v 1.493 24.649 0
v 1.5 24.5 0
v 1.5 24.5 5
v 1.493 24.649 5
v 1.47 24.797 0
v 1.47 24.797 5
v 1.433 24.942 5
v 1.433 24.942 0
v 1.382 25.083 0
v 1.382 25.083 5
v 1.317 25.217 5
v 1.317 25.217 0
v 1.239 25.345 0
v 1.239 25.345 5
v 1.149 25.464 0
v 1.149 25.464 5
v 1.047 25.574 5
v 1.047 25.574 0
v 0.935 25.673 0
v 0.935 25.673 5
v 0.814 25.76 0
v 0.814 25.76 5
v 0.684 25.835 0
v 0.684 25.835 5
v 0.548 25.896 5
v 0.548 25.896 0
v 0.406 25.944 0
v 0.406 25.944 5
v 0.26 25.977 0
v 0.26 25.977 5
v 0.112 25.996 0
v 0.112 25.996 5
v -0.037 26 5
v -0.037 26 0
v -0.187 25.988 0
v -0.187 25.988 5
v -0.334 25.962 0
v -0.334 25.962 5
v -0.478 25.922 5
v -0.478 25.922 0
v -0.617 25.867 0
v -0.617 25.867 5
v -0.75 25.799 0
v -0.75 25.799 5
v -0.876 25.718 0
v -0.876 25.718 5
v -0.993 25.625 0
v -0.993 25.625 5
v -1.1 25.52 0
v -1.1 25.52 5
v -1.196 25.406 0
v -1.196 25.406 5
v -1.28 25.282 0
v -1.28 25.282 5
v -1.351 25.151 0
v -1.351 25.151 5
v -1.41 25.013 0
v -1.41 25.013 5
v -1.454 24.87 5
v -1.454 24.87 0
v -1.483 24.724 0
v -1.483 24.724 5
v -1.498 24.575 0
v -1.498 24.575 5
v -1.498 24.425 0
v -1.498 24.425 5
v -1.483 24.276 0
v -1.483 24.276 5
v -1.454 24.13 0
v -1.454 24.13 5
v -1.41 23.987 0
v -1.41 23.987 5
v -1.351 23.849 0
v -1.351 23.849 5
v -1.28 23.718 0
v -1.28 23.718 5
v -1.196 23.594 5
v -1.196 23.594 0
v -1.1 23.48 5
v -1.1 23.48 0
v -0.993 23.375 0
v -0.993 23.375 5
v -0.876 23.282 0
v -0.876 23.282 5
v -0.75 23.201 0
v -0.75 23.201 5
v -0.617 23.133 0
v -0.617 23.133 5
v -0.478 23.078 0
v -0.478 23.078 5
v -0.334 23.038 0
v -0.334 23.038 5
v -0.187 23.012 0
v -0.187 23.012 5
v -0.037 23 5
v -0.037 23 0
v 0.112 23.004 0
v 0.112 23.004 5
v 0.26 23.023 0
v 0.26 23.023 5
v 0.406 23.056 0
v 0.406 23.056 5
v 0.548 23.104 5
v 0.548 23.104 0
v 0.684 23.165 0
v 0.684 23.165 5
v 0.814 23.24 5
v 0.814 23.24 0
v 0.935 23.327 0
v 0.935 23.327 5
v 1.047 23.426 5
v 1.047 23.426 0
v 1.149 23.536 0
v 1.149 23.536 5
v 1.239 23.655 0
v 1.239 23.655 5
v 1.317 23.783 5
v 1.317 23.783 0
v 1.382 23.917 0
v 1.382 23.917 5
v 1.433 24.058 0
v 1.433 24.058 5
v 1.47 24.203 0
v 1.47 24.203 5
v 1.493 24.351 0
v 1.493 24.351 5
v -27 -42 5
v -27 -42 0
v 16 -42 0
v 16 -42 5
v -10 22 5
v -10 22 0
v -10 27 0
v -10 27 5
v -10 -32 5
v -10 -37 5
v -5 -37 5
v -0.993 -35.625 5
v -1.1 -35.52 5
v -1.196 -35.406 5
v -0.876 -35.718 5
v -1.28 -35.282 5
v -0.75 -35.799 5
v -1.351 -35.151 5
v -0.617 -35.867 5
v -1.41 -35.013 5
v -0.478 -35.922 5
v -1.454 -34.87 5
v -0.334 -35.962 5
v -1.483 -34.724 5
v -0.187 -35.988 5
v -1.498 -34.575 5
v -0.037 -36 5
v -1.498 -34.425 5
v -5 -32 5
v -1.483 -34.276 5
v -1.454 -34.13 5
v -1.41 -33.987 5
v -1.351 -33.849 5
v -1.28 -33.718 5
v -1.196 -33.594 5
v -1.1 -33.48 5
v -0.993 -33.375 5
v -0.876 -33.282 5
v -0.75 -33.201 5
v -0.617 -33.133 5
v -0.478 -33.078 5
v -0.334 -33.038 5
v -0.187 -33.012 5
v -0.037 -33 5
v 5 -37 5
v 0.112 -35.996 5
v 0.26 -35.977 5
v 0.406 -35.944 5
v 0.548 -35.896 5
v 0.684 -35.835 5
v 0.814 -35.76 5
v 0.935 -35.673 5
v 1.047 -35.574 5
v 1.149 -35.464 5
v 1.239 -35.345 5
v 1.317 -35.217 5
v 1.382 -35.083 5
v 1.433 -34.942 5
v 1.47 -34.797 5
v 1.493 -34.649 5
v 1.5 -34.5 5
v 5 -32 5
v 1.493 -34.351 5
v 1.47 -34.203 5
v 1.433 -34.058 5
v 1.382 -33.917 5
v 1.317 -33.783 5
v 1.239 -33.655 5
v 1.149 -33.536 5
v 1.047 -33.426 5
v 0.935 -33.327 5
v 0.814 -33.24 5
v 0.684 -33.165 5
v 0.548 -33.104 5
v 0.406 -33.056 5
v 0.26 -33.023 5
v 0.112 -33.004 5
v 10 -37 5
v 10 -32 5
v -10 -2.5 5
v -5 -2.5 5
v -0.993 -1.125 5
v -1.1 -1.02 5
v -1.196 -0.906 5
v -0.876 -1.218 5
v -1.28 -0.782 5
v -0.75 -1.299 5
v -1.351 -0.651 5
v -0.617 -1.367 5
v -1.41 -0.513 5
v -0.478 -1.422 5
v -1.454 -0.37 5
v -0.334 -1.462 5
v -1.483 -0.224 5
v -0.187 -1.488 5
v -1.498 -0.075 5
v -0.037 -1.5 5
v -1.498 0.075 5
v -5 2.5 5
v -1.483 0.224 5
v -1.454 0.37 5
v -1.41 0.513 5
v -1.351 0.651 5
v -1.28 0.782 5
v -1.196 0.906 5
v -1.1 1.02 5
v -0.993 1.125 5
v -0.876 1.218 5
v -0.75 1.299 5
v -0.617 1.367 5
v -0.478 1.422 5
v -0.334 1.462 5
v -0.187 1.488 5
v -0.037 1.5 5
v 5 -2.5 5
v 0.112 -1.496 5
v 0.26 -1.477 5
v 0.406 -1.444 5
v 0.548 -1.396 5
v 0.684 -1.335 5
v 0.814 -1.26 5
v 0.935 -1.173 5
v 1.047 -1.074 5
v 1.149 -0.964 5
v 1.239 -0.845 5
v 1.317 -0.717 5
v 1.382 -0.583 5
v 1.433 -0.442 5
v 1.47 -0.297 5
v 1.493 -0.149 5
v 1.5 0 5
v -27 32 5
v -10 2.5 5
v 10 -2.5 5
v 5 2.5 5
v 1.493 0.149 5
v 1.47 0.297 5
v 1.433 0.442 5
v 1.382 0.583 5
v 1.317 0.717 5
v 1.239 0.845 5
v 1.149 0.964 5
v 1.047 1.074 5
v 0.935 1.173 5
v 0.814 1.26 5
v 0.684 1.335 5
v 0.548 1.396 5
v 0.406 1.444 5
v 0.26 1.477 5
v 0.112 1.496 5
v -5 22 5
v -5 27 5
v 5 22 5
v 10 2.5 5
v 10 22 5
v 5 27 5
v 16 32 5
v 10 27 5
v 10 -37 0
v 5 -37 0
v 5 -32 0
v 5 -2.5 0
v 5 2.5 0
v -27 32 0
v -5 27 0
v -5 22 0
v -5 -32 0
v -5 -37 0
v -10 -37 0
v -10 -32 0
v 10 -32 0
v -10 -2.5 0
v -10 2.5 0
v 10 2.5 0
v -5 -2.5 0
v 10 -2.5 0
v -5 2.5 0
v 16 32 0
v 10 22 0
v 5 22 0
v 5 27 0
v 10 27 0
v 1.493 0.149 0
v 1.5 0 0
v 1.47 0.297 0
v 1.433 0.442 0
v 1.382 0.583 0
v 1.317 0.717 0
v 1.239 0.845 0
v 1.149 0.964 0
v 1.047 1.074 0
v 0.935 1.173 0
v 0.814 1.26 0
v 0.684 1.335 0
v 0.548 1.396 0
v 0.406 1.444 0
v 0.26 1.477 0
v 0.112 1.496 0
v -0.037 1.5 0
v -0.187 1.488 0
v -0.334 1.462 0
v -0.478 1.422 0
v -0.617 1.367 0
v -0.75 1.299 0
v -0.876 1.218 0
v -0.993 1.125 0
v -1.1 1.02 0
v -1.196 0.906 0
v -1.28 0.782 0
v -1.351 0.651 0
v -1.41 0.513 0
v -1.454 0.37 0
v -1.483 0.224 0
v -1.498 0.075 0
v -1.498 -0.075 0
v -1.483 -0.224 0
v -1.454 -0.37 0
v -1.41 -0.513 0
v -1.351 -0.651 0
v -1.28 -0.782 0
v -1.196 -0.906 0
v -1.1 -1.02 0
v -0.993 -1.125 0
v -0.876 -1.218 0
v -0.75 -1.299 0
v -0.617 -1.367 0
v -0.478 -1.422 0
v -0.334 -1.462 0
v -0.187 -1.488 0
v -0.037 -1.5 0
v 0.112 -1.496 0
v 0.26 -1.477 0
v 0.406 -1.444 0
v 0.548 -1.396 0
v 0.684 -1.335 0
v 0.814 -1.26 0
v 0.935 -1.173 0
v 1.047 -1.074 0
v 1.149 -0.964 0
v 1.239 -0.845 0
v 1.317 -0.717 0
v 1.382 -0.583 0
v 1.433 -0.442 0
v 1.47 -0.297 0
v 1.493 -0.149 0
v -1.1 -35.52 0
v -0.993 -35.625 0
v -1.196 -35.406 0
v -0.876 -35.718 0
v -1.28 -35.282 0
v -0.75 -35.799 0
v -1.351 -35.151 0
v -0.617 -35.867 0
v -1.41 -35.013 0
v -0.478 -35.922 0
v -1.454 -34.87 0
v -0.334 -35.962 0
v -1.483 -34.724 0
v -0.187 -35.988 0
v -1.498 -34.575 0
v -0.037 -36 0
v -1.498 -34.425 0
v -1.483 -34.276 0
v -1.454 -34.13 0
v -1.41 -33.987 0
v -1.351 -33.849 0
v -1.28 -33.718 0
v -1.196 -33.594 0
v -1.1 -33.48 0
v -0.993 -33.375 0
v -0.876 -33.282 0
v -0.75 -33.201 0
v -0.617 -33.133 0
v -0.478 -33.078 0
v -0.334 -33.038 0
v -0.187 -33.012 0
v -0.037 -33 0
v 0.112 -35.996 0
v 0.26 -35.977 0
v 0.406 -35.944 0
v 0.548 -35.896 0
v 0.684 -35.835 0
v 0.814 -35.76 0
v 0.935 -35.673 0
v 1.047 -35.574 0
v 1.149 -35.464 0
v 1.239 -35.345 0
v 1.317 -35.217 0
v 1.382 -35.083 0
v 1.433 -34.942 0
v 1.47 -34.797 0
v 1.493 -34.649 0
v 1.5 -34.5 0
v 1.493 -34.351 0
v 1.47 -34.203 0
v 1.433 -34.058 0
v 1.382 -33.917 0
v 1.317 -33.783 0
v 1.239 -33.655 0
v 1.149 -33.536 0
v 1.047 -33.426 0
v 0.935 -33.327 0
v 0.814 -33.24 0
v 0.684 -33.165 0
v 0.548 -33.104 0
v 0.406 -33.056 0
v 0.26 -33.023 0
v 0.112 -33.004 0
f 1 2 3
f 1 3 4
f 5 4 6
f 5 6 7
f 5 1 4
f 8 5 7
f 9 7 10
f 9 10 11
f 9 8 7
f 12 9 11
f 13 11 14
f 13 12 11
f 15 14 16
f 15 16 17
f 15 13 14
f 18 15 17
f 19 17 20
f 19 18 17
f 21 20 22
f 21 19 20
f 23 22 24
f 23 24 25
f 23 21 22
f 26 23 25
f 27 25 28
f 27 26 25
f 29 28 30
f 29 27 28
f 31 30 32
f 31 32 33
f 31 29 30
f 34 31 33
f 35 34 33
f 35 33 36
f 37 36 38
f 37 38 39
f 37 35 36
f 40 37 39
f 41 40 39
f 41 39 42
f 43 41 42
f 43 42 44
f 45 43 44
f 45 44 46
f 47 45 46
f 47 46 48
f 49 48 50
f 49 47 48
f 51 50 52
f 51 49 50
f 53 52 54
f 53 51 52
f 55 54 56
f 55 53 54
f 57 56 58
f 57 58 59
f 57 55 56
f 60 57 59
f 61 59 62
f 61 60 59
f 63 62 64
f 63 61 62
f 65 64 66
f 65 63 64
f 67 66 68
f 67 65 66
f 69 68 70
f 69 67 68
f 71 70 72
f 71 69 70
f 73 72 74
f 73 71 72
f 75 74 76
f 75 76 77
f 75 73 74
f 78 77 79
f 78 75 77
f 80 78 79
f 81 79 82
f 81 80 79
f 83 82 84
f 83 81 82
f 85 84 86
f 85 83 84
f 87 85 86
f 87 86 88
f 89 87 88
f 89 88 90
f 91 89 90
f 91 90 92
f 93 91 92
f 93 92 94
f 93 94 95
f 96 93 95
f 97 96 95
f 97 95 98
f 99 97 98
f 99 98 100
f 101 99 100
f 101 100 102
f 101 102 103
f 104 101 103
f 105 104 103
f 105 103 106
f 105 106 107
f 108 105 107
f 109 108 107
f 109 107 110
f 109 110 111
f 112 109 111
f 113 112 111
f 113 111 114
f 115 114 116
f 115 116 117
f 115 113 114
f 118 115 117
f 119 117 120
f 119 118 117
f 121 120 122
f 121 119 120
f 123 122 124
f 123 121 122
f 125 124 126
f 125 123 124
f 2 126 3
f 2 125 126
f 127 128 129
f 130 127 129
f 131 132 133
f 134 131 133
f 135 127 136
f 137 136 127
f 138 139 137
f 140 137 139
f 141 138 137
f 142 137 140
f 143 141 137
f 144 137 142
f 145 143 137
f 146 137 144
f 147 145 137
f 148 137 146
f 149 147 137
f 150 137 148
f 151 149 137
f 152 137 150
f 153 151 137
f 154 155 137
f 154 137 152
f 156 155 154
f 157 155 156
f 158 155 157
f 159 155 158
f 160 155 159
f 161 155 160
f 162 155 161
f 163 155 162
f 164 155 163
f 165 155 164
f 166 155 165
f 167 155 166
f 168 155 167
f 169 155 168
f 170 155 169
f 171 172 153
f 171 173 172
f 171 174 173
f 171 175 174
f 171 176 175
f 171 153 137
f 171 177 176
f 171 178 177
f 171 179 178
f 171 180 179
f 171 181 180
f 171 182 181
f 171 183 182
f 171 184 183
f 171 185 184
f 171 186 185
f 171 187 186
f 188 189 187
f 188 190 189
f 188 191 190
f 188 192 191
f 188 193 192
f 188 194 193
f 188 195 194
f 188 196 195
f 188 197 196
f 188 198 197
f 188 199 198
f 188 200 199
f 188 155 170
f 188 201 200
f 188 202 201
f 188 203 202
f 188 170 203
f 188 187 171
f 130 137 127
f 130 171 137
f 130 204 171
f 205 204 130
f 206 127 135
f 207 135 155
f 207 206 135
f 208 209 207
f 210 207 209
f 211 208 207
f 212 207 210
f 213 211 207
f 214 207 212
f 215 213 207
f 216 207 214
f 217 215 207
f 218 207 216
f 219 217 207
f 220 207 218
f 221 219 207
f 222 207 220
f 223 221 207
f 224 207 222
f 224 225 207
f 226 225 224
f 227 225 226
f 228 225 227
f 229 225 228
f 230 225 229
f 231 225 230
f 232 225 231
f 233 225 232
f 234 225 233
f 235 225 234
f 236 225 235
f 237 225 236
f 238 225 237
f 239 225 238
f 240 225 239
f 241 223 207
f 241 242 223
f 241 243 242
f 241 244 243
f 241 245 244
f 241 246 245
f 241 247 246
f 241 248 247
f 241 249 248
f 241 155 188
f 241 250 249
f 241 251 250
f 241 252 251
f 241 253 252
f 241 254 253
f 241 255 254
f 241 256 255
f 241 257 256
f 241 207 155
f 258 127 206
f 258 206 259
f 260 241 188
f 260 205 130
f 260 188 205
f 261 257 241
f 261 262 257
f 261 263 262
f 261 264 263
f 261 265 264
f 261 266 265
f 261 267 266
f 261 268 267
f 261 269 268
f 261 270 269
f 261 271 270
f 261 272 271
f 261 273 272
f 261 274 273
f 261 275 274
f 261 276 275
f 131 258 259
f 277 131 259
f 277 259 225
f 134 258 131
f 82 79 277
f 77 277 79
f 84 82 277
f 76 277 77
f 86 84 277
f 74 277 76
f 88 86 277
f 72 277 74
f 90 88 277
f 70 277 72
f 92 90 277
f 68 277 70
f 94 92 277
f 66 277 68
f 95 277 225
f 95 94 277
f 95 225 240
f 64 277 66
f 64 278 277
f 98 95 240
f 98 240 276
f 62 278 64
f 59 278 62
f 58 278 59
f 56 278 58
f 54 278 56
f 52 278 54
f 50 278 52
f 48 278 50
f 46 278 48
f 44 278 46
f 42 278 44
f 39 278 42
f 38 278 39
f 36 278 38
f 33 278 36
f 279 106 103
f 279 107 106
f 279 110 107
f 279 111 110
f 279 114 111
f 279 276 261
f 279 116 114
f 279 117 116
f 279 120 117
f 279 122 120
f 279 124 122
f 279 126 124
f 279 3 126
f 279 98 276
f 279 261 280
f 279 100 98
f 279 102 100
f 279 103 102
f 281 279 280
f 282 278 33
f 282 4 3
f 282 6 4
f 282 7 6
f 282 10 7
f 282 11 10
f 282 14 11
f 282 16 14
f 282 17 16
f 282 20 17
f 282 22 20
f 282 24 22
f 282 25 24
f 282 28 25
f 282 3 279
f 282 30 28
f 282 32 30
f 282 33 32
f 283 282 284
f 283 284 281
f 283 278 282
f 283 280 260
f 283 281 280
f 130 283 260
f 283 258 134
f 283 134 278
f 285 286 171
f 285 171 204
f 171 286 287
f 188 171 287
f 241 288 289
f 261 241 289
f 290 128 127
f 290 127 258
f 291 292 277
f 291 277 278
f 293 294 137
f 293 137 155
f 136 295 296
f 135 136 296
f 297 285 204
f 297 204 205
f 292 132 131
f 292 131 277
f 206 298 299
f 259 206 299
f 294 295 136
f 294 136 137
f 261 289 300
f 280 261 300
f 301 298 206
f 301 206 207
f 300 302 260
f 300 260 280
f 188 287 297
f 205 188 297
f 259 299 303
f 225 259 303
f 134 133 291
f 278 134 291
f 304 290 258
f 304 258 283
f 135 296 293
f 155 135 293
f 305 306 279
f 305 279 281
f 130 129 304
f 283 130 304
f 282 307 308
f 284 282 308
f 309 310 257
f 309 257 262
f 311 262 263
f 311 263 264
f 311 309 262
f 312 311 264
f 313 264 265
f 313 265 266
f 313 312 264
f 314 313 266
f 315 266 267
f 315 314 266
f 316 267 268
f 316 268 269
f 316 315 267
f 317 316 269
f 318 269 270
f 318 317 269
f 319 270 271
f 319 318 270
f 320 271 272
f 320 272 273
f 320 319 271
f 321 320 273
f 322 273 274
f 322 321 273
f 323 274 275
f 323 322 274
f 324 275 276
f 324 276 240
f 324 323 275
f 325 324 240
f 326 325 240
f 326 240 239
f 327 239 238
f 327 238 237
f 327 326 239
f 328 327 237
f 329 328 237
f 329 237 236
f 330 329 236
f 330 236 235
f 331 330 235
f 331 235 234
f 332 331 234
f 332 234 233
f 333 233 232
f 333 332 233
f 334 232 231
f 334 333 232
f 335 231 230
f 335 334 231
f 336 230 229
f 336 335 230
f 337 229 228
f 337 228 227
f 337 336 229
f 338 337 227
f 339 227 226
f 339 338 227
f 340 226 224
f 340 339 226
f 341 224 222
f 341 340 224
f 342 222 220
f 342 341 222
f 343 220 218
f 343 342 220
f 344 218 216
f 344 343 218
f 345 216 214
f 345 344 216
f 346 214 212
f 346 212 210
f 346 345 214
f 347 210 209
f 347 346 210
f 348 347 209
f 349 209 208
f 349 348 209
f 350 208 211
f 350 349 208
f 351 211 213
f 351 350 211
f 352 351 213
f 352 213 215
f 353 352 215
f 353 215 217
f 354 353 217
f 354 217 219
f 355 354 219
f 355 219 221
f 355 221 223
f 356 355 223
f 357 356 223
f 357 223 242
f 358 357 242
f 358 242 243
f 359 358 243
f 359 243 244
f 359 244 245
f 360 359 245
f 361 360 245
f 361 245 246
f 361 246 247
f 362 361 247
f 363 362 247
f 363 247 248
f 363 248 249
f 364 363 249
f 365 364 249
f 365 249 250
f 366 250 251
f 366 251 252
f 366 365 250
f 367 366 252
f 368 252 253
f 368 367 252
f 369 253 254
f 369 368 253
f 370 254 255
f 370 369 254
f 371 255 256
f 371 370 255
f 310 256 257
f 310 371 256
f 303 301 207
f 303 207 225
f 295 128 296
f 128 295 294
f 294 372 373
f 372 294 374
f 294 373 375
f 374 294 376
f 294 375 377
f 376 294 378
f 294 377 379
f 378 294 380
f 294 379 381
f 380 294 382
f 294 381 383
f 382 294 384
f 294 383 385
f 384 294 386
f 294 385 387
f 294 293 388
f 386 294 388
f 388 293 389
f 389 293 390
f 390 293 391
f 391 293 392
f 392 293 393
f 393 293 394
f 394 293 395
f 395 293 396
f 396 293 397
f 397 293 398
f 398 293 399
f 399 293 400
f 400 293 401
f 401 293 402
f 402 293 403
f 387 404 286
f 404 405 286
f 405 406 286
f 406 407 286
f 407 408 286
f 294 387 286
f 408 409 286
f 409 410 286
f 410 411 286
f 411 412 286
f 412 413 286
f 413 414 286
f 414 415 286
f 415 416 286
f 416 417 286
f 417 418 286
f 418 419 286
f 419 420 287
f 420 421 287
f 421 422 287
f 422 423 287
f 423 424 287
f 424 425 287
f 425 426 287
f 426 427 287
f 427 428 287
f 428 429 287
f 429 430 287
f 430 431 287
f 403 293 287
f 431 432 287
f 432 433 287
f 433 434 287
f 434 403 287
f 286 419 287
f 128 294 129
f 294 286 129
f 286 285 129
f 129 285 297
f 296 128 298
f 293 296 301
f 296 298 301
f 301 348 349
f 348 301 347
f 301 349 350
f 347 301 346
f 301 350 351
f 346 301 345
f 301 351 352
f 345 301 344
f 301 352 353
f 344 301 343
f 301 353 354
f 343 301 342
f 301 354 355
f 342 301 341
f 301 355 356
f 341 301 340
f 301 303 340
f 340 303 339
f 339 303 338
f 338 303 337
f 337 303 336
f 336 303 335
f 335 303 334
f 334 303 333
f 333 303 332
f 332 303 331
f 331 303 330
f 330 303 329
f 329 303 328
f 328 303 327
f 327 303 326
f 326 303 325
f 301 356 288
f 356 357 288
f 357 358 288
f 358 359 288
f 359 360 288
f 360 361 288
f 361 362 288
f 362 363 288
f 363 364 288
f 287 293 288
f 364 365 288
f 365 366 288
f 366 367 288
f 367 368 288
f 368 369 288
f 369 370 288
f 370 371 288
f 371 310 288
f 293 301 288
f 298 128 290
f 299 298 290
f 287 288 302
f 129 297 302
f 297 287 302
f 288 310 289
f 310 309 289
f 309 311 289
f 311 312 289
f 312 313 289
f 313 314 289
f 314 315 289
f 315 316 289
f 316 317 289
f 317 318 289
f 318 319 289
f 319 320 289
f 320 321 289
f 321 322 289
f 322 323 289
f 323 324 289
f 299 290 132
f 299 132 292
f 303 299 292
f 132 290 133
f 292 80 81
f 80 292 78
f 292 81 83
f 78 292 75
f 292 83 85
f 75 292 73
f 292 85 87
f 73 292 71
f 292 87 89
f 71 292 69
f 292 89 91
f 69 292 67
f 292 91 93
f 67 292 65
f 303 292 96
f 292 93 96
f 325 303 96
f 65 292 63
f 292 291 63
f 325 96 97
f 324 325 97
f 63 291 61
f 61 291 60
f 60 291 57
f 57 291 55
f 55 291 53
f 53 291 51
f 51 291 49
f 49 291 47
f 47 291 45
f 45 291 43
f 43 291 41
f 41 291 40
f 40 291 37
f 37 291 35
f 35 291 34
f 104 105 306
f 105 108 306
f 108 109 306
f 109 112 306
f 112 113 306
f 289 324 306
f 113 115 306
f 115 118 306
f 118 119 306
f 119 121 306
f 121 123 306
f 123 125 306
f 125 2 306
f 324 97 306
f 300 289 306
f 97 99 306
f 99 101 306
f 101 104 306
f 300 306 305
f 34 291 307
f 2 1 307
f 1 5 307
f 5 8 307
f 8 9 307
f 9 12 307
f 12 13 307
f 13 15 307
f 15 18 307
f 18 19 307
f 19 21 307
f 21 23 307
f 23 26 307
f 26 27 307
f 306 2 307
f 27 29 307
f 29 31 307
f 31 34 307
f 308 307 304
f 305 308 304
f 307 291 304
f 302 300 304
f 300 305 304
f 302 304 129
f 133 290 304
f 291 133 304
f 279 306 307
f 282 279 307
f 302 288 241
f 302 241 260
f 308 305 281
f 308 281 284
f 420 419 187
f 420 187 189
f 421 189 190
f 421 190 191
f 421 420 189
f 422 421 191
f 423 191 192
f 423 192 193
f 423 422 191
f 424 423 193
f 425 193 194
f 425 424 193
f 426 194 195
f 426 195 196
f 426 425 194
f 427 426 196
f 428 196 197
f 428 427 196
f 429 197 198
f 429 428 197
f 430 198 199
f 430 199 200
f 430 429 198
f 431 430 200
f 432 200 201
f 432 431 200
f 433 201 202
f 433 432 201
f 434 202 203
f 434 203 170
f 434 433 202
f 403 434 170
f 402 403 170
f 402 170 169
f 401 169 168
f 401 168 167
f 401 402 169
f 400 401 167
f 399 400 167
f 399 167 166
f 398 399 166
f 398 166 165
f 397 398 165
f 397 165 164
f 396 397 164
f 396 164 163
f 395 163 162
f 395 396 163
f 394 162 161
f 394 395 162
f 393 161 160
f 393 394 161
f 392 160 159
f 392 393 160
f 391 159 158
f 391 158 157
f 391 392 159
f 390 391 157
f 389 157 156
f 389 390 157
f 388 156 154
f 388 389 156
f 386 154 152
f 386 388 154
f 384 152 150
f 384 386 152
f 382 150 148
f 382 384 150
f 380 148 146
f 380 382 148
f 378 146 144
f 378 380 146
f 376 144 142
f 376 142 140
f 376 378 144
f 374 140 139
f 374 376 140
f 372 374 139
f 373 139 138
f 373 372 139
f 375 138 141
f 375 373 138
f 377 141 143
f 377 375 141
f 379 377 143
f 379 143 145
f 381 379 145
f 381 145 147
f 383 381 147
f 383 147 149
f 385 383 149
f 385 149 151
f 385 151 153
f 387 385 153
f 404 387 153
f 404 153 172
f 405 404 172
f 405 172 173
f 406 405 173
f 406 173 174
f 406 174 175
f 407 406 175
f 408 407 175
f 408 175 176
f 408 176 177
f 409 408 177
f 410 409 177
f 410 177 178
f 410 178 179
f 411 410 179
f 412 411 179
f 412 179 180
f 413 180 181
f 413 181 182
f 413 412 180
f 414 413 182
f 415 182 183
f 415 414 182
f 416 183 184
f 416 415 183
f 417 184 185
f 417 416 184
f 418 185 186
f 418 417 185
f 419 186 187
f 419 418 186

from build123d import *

# Parameters (mm, degrees)
SKETCH1_W           = 43
SKETCH1_H           = 74
SKETCH1_R           = 1.5
SKETCH1_W_2         = 5
SKETCH1_H_2         = 5
BOSS_EXTRUDE1_DEPTH = 5


with BuildPart() as part:
    # Sketch1 → Boss-Extrude1 (new body)
    with BuildSketch(Plane.XY):
        with Locations((-5.5, -5)):
            Rectangle(SKETCH1_W, SKETCH1_H)
        Circle(SKETCH1_R, mode=Mode.SUBTRACT)
        with Locations((0, 24.5)):
            Circle(SKETCH1_R, mode=Mode.SUBTRACT)
        with Locations((0, -34.5)):
            Circle(SKETCH1_R, mode=Mode.SUBTRACT)
        with Locations((-7.5, 0)):
            Rectangle(SKETCH1_W_2, SKETCH1_H_2, mode=Mode.SUBTRACT)
        with Locations((7.5, 0)):
            Rectangle(SKETCH1_W_2, SKETCH1_H_2, mode=Mode.SUBTRACT)
        with Locations((-7.5, 24.5)):
            Rectangle(SKETCH1_W_2, SKETCH1_H_2, mode=Mode.SUBTRACT)
        with Locations((7.5, 24.5)):
            Rectangle(SKETCH1_W_2, SKETCH1_H_2, mode=Mode.SUBTRACT)
        with Locations((-7.5, -34.5)):
            Rectangle(SKETCH1_W_2, SKETCH1_H_2, mode=Mode.SUBTRACT)
        with Locations((7.5, -34.5)):
            Rectangle(SKETCH1_W_2, SKETCH1_H_2, mode=Mode.SUBTRACT)
    extrude(amount=BOSS_EXTRUDE1_DEPTH)


solid = part.part
